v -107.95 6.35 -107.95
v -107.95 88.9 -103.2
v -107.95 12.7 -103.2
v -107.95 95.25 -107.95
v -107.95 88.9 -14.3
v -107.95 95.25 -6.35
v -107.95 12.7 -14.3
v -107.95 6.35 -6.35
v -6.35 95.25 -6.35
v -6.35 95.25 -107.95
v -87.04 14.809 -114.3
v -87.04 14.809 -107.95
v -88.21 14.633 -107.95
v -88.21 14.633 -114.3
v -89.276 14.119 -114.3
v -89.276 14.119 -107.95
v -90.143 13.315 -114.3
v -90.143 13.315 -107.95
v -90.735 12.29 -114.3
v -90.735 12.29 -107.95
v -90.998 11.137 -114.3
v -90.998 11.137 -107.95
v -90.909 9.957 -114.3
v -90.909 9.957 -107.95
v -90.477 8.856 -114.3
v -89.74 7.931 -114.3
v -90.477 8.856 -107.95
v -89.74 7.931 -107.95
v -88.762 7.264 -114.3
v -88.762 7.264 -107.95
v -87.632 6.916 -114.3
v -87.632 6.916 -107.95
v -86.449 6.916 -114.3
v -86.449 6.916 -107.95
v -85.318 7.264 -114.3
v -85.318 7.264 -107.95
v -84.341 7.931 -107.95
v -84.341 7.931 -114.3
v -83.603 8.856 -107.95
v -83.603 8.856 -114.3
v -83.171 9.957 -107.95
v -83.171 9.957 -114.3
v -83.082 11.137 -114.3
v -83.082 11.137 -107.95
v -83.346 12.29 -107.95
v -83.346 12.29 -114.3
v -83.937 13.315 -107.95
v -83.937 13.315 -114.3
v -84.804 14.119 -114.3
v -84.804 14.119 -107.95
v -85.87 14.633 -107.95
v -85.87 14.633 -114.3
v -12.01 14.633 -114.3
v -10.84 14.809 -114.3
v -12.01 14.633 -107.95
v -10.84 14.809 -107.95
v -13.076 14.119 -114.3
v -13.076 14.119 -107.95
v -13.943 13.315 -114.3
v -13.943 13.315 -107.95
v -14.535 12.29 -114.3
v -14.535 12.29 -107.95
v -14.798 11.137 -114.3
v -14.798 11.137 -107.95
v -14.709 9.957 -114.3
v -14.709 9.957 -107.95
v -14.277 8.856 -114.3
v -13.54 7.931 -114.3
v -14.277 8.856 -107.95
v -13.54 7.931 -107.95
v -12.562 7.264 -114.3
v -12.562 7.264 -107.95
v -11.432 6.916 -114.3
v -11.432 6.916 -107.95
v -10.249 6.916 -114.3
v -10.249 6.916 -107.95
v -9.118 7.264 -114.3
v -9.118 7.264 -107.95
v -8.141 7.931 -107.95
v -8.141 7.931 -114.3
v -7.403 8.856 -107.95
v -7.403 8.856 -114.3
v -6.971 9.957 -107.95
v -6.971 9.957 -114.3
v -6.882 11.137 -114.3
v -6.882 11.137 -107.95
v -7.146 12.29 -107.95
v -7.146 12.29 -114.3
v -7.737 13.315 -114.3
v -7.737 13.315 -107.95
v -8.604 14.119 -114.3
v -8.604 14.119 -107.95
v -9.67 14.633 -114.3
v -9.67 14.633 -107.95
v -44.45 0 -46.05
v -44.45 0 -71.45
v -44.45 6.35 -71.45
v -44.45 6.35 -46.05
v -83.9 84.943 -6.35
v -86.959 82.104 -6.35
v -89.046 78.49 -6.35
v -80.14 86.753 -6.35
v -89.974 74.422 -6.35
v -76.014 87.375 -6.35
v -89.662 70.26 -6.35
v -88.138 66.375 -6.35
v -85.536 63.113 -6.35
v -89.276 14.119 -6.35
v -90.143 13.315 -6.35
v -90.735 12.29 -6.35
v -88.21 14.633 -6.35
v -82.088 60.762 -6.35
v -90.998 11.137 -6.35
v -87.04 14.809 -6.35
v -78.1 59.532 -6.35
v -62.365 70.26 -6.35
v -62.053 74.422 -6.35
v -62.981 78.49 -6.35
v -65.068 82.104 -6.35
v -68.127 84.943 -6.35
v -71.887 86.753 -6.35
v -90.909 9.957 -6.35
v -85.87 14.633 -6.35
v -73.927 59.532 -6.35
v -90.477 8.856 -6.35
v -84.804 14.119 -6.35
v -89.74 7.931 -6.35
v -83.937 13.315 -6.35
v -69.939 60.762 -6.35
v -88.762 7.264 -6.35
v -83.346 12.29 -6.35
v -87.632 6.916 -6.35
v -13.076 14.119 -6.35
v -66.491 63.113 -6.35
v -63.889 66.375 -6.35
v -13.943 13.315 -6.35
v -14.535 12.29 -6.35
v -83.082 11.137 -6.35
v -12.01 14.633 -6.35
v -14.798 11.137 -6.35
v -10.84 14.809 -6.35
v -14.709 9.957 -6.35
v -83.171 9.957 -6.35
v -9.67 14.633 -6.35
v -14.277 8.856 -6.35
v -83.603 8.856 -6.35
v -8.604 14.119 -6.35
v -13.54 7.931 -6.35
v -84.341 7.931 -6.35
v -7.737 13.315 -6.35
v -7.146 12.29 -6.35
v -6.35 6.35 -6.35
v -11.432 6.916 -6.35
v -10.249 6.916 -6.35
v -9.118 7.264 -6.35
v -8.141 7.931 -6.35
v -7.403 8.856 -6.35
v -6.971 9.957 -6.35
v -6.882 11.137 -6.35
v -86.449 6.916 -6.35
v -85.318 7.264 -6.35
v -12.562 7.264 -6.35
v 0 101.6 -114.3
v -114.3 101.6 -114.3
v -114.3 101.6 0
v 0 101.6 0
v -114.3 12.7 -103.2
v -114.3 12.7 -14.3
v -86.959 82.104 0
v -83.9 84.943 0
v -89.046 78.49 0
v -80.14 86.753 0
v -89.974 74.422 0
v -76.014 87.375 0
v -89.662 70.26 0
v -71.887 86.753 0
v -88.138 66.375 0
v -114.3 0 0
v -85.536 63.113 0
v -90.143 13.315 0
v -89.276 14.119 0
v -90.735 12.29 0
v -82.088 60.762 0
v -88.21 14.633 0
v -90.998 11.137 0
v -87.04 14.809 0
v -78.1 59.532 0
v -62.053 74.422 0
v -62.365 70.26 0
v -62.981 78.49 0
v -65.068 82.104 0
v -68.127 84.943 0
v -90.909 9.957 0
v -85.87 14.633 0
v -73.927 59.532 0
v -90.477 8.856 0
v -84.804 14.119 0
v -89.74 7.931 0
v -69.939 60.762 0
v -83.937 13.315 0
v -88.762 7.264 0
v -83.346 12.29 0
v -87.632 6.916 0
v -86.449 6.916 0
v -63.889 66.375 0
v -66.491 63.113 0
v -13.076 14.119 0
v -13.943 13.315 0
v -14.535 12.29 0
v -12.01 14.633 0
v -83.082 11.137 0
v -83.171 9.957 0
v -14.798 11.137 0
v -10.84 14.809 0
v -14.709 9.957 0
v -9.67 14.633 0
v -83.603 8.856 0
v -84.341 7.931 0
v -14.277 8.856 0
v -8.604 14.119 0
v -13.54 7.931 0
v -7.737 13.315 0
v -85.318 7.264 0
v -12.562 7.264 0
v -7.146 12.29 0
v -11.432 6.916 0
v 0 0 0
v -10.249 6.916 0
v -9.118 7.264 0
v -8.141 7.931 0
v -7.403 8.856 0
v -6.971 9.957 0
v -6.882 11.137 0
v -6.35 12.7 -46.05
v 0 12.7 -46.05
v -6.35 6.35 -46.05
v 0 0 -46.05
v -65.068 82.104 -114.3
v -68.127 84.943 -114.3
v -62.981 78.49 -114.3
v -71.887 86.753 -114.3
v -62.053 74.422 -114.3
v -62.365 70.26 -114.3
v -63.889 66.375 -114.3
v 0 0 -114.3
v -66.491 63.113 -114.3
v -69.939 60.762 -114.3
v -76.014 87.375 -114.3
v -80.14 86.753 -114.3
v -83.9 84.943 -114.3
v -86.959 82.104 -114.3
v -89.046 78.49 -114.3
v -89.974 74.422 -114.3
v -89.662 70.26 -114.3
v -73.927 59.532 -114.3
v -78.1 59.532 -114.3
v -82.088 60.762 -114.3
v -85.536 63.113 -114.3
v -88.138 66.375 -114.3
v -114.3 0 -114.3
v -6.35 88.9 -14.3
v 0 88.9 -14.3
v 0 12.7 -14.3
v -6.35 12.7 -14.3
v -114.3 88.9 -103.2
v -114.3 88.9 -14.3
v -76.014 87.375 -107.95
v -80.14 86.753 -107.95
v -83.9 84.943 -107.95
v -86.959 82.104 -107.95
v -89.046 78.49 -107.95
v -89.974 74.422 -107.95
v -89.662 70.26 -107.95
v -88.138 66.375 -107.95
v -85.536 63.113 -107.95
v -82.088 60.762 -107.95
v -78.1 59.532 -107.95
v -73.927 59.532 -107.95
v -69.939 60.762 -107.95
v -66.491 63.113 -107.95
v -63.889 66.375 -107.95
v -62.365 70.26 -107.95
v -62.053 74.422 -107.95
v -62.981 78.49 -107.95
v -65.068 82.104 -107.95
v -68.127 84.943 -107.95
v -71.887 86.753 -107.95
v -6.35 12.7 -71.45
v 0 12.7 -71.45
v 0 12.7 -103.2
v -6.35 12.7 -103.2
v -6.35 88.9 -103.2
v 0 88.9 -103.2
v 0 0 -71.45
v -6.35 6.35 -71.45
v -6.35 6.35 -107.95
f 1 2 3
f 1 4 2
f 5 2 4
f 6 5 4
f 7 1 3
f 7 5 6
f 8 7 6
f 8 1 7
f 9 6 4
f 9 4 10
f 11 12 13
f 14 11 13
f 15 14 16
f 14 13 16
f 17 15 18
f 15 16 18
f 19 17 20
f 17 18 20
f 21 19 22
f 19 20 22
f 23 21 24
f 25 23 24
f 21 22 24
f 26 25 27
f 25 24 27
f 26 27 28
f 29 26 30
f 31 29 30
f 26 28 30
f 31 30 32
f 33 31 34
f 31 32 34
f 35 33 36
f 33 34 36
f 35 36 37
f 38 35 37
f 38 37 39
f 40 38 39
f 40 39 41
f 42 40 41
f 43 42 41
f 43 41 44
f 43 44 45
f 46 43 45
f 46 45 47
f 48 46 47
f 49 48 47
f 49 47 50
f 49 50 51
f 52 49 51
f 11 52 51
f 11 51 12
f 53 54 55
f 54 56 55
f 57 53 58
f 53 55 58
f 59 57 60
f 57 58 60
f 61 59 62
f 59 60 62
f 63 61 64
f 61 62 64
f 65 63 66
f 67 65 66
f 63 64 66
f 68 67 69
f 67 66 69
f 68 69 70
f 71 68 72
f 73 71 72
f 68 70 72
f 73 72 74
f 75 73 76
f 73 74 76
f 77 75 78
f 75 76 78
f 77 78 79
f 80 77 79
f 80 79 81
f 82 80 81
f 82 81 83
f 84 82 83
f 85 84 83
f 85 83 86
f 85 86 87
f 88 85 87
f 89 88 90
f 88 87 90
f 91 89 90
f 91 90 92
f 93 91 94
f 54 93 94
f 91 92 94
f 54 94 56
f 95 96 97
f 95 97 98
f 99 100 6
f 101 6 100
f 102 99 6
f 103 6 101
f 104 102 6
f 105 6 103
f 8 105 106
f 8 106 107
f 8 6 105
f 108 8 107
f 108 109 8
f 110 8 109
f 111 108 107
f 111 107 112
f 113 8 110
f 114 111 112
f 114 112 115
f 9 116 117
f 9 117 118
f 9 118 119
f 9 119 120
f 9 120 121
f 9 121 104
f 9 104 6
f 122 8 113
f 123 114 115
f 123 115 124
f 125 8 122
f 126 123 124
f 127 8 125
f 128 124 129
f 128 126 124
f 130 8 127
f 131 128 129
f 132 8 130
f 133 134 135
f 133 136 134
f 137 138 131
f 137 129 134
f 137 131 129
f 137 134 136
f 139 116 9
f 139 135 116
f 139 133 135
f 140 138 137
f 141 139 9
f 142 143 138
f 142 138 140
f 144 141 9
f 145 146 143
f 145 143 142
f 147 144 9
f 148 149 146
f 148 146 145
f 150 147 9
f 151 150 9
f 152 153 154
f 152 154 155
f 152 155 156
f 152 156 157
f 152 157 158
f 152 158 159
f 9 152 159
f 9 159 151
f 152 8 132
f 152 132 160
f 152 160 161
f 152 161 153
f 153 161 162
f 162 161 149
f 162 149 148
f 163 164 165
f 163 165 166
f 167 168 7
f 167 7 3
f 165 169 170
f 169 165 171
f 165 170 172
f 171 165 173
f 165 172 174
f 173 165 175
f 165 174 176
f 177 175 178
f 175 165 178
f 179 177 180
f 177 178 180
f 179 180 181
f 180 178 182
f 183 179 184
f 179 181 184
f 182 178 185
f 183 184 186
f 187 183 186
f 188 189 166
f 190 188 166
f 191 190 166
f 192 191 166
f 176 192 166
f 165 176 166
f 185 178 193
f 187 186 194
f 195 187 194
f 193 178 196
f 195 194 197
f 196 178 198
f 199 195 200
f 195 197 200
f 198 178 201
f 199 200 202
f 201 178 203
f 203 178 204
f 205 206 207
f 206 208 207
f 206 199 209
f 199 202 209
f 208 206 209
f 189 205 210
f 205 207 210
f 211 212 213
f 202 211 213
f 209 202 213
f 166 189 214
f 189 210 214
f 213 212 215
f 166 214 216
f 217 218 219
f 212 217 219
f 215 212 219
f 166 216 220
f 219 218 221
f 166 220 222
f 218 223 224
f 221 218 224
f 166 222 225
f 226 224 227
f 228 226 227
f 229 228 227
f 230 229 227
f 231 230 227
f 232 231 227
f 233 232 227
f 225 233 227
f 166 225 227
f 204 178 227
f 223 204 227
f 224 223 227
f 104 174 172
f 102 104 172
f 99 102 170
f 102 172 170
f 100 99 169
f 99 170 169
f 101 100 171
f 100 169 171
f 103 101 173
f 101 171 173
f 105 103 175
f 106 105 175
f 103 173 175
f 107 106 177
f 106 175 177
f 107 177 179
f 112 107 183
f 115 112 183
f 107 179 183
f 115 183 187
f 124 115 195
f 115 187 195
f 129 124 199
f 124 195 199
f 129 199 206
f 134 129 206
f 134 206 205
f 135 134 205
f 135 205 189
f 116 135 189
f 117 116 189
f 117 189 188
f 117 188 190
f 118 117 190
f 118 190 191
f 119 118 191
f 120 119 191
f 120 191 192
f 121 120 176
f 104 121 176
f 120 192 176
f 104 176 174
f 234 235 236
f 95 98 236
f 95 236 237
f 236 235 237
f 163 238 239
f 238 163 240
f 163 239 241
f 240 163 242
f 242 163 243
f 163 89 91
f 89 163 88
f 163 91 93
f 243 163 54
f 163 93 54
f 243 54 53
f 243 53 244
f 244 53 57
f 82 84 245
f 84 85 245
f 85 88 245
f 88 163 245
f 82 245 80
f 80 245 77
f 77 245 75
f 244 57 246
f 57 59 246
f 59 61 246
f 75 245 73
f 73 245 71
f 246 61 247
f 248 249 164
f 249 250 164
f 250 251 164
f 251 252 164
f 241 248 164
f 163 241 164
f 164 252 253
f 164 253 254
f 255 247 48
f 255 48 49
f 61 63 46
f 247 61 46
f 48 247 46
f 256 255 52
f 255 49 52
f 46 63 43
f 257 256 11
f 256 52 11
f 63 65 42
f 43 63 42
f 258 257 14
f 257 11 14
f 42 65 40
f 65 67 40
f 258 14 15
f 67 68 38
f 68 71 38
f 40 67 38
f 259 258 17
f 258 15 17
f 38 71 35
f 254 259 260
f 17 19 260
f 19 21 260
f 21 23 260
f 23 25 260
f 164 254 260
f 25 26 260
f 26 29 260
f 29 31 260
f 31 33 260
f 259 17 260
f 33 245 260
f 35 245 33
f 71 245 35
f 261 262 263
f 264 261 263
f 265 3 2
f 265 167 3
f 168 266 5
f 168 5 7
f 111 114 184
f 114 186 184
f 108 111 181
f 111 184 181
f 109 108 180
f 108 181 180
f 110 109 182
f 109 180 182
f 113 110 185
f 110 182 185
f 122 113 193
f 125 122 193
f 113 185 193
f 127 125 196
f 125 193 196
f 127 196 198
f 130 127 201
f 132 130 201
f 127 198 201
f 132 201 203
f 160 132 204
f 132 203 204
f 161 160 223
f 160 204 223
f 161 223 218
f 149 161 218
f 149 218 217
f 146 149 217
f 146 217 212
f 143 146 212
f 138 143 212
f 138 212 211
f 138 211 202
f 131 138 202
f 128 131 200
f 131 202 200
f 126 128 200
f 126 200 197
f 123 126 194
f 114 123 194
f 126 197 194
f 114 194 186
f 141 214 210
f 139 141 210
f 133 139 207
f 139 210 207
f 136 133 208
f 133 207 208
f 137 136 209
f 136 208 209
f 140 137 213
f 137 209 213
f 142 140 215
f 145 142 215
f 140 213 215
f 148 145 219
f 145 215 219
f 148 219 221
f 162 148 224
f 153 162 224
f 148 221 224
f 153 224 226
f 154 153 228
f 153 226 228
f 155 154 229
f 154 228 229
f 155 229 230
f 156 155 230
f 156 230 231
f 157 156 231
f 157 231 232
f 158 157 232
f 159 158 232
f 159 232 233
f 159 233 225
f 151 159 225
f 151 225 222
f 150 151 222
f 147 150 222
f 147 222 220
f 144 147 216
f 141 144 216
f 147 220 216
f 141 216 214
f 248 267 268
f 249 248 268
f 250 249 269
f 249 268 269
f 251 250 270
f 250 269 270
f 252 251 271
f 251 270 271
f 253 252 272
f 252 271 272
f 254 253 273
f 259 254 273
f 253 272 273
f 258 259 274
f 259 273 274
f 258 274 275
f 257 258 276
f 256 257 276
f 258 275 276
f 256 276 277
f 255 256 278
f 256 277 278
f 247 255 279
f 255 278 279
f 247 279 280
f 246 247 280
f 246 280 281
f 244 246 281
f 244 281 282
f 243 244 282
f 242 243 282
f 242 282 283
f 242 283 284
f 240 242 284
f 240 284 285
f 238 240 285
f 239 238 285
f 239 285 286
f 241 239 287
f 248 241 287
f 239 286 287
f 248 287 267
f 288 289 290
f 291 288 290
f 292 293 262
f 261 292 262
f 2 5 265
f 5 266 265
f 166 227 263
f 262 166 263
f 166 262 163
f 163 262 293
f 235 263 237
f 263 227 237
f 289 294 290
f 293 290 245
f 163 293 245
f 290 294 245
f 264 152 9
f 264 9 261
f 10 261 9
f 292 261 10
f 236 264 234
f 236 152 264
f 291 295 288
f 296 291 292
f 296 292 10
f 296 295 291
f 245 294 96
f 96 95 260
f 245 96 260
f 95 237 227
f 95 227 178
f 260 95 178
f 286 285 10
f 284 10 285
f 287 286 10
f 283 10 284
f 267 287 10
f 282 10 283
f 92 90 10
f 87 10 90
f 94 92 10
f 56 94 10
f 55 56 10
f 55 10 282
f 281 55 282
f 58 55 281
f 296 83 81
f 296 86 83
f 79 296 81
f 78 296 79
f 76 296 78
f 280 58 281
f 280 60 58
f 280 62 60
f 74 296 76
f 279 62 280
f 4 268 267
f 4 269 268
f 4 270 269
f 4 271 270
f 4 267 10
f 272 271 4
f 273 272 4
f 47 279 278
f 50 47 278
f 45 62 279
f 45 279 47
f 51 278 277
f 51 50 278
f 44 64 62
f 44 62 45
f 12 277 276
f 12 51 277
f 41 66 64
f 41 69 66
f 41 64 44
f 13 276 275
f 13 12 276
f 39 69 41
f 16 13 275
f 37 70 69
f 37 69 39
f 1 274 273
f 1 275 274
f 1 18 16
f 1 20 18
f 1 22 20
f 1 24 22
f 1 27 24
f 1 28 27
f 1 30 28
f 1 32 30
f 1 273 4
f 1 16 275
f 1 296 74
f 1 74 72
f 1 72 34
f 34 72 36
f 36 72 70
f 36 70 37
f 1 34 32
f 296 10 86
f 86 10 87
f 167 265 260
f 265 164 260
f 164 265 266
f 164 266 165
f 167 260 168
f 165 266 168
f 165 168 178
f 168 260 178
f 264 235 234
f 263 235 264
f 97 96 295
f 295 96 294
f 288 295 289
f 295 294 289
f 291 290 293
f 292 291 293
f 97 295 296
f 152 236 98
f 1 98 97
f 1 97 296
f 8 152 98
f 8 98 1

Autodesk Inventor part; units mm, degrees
ref_plane "YZ Plane" through (0, 0, 0) normal (1, 0, 0) x (0, 1, 0)
ref_plane "XZ Plane" through (0, 0, 0) normal (0, 1, 0) x (-1, 0, 0)
ref_plane "XY Plane" through (0, 0, 0) normal (0, 0, 1) x (1, 0, 0)
sketch "Sketch1" plane through (0, 0, 0) normal (0, 1, 0) x (-1, 0, 0)
  line L0 (114.3, 0) -> (114.3, -114.3)
  line L1 (114.3, -114.3) -> (0, -114.3)
  line L2 (25.4, -71.4495) -> (0, -71.4495)
  line L3 (25.4, -46.0495) -> (0, -46.0495)
  line L4 (0, -114.3) -> (0, -71.4495)
  line L5 (114.3, 0) -> (0, 0)
  line L6 (0, 0) -> (0, -46.0495)
  line L7 (25.4, -71.4495) -> (44.45, -71.4495)
  line L8 (44.45, -71.4495) -> (44.45, -46.0495)
  line L9 (44.45, -46.0495) -> (25.4, -46.0495)
extrude "Extrusion1" add sketch "Sketch1" along normal blind 6.35
sketch "Sketch2" plane through (0, 6.35, 0) normal (0, 1, 0) x (1, 0, 0)
  line L0 (-114.3, 0) -> (0, 0) projected
  line L1 (-114.3, 0) -> (-114.3, 6.35)
  line L2 (-114.3, 114.3) -> (-114.3, 0) projected
  line L3 (-114.3, 6.35) -> (0, 6.35)
  line L4 (0, 0) -> (0, 46.0495) projected
  line L5 (0, 0) -> (-114.3, 0)
  line L6 (0, 114.3) -> (-114.3, 114.3) projected
  line L7 (0, 114.3) -> (0, 107.95)
  line L8 (0, 114.3) -> (0, 71.4495) projected
  line L9 (0, 107.95) -> (-114.3, 107.95)
  line L10 (-114.3, 114.3) -> (0, 114.3)
extrude "Extrusion2" add sketch "Sketch2" along normal blind 88.9
sketch "Sketch3" plane through (0, 95.25, 0) normal (0, 1, 0) x (1, 0, 0)
  line L0 (-114.3, 6.35) -> (-114.3, 0) projected
  line L1 (0, 114.3) -> (-114.3, 114.3) projected
  line L2 (-114.3, 0) -> (0, 0)
  line L3 (0, 0) -> (0, 114.3)
  line L4 (0, 114.3) -> (-114.3, 114.3)
  line L5 (-114.3, 114.3) -> (-114.3, 0)
  point P0 (0, 0)
extrude "Extrusion3" add sketch "Sketch3" along normal blind 6.35
sketch "Sketch4" plane through (0, 6.35, 0) normal (0, 1, 0) x (1, 0, 0)
  line L0 (0, 6.35) -> (0, 46.0495) projected
  line L1 (0, 107.95) -> (-114.3, 107.95) projected
  line L2 (0, 6.35) -> (0, 107.95)
  line L3 (0, 6.35) -> (-6.35, 6.35)
  line L4 (-114.3, 6.35) -> (0, 6.35) projected
  line L5 (-6.35, 6.35) -> (-6.35, 107.95)
  line L6 (0, 71.4495) -> (0, 107.95) projected
  line L7 (0, 107.95) -> (-6.35, 107.95)
  point P0 (0, 0)
  dimension "d13" = 6.35
extrude "Extrusion4" add sketch "Sketch4" along normal blind 88.9
sketch "Sketch5" plane through (0, 0, 0) normal (1, 0, 0) x (0, 0, -1)
  line L0 (46.0495, 6.35) -> (71.4495, 6.35) projected
  line L1 (46.0495, 6.35) -> (71.4495, 6.35)
  line L2 (71.4495, 6.35) -> (71.4495, 12.7)
  line L3 (46.0495, 12.7) -> (46.0495, 6.35)
  line L4 (46.0495, 12.7) -> (14.2995, 12.7)
  line L5 (71.4495, 12.7) -> (103.1995, 12.7)
  line L6 (103.1995, 12.7) -> (103.1995, 88.9)
  line L7 (107.95, 95.25) -> (6.35, 95.25) projected
  line L8 (103.1995, 88.9) -> (14.2995, 88.9)
  line L9 (14.2995, 88.9) -> (14.2995, 12.7)
  point P0 (0, 0)
extrude "Extrusion5" cut sketch "Sketch5" against normal blind 6.35
sketch "Sketch6" plane through (0, 6.35, 0) normal (0, 1, 0) x (1, 0, 0)
  line L0 (-114.3, 107.95) -> (-114.3, 6.35) projected
  line L1 (-114.3, 6.35) -> (-114.3, 107.95)
  line L2 (-114.3, 107.95) -> (-107.95, 107.95)
  line L3 (-107.95, 107.95) -> (-107.95, 6.35)
  line L4 (-107.95, 6.35) -> (-114.3, 6.35)
  point P0 (0, 0)
extrude "Extrusion6" add sketch "Sketch6" along normal blind 88.9
sketch "Sketch7" plane through (-114.3, 0, -114.3) normal (-1, 0, 0) x (0, 0, 1)
  line L0 (100.0005, 88.9) -> (11.1005, 88.9) projected
  line L1 (100.0005, 88.9) -> (100.0005, 12.7) projected
  line L2 (11.1005, 88.9) -> (100.0005, 88.9)
  line L3 (100.0005, 88.9) -> (100.0005, 12.7)
  line L4 (100.0005, 12.7) -> (11.1005, 12.7)
  line L5 (11.1005, 12.7) -> (11.1005, 88.9)
  point P0 (114.3, 0)
extrude "Extrusion7" cut sketch "Sketch7" against normal blind 6.35
sketch "Sketch8" plane through (0, 0, -114.3) normal (0, 0, -1) x (-1, 0, 0)
  line L0 (114.3, 0) -> (0, 0) projected
  line L1 (6.35, 6.35) -> (107.95, 6.35) projected
  circle A0 centre (10.8401, 10.8401) radius 4.4901
hole "Hole1" at (-10.8401, 10.8401, -114.3) direction (0, 0, 1) diameter 7.9375 end through all
sketch "Sketch9" plane through (0, 0, -114.3) normal (0, 0, -1) x (-1, 0, 0)
  circle A0 centre (10.8401, 10.8401) radius 3.9687 projected
  circle A1 centre (87.0401, 10.8401) radius 3.9688
  point P0 (0, 0)
hole "Hole2" at (-87.0401, 10.8401, -114.3) direction (0, 0, 1) diameter 7.9375 end through all
sketch "Sketch10" plane through (0, 0, -114.3) normal (0, 0, -1) x (-1, 0, 0)
  circle A0 centre (87.0401, 10.8401) radius 3.9687 projected
  line L0 (87.0401, 10.8401) -> (150.5401, 10.8401) construction
  circle A1 centre (76.0135, 73.3754) radius 14
  point P0 (0, 0)
hole "Hole3" at (-76.0135, 73.3754, -114.3) direction (0, 0, 1) diameter 28 end through all
sketch "Sketch11" plane through (0, 101.6, 0) normal (0, 1, 0) x (1, 0, 0)
  point P0 (0, 0)
properties part number "Chasis_rework"
